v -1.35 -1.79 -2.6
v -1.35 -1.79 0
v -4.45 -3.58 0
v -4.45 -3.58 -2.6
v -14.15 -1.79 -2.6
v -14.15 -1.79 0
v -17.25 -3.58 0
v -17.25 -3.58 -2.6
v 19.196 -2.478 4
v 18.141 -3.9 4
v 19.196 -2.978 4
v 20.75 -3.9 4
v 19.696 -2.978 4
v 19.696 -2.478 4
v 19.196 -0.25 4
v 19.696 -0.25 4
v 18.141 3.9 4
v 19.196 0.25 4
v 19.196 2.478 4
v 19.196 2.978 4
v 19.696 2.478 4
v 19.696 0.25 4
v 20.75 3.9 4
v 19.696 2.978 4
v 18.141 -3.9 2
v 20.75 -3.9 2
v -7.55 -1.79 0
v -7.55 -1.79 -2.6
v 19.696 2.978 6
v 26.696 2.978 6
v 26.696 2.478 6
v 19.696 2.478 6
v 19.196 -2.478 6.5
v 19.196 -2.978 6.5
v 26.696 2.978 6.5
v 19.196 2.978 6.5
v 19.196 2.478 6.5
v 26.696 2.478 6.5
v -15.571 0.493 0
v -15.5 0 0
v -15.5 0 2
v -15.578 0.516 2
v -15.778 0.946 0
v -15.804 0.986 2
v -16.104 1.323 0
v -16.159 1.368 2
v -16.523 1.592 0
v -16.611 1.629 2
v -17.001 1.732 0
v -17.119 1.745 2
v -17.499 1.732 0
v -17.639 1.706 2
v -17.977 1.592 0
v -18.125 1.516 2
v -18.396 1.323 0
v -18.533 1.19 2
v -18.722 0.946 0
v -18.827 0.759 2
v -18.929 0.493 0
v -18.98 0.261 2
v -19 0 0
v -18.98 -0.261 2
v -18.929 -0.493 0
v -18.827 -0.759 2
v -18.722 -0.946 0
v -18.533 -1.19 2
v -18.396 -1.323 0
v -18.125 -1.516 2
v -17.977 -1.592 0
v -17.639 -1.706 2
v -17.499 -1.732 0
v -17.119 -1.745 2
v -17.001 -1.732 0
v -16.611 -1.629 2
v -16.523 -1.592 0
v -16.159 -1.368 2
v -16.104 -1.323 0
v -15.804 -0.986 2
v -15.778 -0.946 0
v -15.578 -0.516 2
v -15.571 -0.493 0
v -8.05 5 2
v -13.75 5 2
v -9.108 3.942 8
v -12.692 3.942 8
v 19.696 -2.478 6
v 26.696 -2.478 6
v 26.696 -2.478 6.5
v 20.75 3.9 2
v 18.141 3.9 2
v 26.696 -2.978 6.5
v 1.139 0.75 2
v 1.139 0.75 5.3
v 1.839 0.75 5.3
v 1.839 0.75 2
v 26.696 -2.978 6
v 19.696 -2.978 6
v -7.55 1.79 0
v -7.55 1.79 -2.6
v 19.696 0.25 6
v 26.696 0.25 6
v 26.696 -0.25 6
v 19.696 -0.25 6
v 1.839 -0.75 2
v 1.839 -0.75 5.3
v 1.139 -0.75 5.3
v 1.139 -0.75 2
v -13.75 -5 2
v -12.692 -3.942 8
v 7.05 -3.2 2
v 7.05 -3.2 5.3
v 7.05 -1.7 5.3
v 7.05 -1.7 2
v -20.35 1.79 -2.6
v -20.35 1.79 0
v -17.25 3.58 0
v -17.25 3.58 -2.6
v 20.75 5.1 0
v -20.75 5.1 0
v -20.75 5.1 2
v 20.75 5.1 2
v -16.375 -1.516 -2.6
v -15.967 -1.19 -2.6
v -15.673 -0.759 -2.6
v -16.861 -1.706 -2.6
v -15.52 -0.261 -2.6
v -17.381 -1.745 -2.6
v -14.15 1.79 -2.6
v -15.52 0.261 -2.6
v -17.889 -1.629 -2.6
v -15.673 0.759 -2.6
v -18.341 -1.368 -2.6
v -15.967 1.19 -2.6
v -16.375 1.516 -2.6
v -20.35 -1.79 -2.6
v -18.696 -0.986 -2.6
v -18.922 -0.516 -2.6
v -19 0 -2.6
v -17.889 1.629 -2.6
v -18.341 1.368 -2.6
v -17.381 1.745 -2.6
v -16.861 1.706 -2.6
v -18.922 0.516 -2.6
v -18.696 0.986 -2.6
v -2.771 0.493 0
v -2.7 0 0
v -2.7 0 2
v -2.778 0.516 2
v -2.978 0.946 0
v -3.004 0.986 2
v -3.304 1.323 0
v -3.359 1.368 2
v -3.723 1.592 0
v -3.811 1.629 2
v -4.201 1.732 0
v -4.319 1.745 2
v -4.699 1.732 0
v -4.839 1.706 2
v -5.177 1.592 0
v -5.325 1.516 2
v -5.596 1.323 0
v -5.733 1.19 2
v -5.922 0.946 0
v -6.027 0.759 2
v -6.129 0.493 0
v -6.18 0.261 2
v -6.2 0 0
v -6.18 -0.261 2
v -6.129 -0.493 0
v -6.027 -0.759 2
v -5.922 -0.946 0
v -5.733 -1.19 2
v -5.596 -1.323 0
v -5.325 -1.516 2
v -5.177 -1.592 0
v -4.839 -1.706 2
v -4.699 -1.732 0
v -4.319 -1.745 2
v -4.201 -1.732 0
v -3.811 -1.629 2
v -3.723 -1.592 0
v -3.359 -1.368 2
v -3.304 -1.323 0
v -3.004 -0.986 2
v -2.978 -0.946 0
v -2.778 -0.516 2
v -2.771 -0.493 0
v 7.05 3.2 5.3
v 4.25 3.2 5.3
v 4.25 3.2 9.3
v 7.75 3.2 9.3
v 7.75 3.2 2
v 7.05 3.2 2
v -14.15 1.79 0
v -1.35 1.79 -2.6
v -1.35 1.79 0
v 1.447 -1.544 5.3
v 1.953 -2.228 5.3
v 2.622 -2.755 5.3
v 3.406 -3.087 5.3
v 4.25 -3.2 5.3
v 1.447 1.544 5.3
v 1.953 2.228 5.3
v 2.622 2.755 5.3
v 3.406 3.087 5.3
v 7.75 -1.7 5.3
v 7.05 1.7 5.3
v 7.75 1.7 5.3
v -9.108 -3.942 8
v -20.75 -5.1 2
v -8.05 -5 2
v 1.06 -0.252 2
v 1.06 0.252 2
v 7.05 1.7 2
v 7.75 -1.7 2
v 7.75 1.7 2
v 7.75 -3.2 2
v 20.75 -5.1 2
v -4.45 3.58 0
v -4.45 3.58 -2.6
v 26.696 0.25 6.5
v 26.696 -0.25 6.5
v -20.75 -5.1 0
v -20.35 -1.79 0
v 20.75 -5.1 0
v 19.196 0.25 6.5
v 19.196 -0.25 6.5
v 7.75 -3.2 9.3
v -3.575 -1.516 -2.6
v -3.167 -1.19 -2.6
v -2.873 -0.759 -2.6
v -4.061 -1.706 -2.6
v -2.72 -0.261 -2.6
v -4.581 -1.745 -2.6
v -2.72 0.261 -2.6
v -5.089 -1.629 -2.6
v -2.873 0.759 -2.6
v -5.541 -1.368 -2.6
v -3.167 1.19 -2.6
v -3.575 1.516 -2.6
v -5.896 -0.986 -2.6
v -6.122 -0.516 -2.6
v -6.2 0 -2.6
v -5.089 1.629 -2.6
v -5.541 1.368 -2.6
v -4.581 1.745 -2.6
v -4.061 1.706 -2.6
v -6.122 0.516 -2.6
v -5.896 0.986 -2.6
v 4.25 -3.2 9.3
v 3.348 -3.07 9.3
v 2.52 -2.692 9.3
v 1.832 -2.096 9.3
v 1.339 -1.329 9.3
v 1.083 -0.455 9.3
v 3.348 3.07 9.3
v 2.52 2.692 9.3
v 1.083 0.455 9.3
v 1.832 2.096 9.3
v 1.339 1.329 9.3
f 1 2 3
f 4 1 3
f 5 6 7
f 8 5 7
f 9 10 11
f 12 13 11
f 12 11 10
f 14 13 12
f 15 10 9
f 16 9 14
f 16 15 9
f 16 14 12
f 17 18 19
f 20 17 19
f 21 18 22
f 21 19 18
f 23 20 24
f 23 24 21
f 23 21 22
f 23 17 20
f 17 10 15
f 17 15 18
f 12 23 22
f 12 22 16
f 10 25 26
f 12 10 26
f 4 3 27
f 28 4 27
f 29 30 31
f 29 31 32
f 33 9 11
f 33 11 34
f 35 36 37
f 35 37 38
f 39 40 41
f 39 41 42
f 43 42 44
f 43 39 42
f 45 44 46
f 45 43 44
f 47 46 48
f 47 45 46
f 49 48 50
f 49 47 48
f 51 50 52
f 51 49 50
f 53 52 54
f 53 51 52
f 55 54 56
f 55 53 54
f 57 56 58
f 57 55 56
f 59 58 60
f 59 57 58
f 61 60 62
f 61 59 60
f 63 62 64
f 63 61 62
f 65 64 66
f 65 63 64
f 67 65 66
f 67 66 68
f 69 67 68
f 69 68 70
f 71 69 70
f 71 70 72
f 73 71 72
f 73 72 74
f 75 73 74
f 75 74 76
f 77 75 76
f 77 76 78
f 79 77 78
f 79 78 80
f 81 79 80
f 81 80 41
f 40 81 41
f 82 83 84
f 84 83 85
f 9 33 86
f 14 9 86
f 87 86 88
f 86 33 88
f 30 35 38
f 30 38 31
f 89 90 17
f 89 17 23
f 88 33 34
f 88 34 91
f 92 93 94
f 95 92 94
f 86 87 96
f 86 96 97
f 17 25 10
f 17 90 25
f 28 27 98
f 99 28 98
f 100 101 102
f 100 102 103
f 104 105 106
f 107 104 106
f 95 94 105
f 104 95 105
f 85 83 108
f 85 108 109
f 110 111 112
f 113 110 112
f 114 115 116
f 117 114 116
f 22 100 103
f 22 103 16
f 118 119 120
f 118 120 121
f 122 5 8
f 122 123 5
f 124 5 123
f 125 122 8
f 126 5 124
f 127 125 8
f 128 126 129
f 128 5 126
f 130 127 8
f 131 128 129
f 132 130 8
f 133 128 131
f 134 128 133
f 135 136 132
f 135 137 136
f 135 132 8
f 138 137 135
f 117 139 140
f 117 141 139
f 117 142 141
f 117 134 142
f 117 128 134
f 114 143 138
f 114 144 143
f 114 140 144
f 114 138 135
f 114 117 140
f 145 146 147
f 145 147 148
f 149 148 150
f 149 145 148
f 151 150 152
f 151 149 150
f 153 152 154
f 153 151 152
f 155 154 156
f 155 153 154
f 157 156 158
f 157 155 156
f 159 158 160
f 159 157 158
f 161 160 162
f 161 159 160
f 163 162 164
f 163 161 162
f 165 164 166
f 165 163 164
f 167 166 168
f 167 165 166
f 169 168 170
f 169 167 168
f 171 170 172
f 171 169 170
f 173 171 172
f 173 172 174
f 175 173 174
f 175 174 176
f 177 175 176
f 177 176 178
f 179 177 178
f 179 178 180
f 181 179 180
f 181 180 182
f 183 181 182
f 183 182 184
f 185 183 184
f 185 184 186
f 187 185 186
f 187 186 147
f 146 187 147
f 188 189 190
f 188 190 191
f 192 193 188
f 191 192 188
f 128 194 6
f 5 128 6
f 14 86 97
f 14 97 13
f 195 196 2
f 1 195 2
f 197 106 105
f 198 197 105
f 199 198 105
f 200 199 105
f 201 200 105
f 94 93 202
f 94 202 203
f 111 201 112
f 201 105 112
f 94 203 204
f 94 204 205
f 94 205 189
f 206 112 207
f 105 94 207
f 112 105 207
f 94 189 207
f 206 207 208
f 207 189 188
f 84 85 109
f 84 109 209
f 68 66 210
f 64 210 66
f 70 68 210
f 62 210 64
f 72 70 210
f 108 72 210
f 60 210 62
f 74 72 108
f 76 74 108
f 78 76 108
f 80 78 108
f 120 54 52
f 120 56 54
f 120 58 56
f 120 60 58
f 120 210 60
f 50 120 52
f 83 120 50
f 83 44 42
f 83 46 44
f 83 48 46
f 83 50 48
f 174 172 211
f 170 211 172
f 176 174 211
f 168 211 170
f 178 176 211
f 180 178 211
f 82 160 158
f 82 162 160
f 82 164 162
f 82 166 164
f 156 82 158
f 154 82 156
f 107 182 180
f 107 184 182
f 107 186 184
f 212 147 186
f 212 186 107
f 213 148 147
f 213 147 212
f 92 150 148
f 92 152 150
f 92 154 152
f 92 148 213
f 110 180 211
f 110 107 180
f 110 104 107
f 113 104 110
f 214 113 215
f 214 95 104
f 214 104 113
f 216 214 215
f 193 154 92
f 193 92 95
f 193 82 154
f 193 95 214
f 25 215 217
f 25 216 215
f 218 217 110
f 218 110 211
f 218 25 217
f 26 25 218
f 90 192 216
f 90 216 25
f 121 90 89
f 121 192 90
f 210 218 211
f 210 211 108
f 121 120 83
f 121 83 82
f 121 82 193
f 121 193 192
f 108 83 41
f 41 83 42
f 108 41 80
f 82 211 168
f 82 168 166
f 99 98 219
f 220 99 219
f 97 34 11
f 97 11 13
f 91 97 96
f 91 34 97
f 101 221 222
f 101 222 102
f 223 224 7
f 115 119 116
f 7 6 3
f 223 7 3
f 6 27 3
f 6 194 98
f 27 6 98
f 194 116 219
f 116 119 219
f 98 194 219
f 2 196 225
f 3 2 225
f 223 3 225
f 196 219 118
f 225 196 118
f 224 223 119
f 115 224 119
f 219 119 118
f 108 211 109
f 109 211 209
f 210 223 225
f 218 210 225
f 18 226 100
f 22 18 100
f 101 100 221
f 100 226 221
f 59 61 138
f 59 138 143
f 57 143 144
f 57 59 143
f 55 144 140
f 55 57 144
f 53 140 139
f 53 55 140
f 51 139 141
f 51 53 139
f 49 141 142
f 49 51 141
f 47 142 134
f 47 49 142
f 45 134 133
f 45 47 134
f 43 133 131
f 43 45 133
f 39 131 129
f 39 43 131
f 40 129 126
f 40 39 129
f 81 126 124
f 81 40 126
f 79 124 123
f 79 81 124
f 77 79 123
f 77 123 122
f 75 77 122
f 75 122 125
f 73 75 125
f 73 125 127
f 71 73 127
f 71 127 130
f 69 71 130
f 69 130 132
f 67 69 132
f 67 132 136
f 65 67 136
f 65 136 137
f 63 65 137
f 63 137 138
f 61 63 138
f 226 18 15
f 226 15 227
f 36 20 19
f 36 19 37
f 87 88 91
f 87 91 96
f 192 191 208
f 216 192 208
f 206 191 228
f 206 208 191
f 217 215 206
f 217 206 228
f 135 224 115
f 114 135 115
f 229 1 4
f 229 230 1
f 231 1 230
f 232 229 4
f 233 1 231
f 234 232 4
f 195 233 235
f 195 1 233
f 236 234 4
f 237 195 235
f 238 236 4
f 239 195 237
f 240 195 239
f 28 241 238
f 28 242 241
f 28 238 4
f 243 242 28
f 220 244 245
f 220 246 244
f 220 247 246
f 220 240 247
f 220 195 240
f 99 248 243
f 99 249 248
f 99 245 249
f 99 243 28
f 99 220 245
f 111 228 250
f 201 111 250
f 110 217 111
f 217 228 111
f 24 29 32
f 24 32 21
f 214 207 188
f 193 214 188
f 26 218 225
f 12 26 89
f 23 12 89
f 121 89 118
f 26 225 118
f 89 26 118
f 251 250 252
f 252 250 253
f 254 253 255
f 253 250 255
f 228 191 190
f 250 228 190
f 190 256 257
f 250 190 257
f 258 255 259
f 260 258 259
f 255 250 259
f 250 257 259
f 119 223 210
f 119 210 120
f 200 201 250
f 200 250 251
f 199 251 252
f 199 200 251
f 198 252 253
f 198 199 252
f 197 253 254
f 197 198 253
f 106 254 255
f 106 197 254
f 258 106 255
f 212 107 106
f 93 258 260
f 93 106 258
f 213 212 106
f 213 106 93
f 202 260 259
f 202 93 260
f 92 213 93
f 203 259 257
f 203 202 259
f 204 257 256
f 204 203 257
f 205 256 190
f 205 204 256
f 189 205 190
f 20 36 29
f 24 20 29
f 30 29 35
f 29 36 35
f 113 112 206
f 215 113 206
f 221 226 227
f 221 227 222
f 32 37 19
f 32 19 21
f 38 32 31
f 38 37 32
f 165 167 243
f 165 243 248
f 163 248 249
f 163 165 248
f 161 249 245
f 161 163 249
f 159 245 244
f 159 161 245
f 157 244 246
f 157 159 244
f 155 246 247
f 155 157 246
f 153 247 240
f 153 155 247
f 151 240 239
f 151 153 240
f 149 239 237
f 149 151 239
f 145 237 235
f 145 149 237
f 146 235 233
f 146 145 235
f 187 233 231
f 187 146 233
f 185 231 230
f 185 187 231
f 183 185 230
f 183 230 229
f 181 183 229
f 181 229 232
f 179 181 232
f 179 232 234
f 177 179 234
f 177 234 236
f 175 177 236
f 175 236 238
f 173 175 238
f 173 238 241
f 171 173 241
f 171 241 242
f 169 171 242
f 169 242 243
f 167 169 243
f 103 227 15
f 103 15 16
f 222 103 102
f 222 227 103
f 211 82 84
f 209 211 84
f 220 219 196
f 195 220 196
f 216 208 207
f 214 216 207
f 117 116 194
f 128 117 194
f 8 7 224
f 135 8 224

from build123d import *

# Parameters (mm, degrees)
ESBO_O1_W                = 41.5
ESBO_O1_H                = 10.2
ESBO_O1_R                = 1.75
RESSALTO_EXTRUS_O1_DEPTH = 2
ESBO_O2_W                = 5.7
ESBO_O2_H                = 10
RESSALTO_EXTRUS_O2_DEPTH = 6
RESSALTO_EXTRUS_O2_TAPER = 10
RESSALTO_EXTRUS_O3_DEPTH = 7.3
CORTE_EXTRUS_O1_START    = -4
CORTE_EXTRUS_O1_DEPTH    = 3.3
RESSALTO_EXTRUS_O4_DEPTH = 3.9
ESBO_O7_W                = 7.5
ESBO_O7_H                = 0.921500294
ESBO_O7_H_2              = 2.228499706
CORTE_EXTRUS_O2_DEPTH    = 2.5
ESBO_O8_R                = 1.75
RESSALTO_EXTRUS_O5_DEPTH = 2.6


with BuildPart() as part:
    # Esboço1 → Ressalto-extrusão1 (new body)
    with BuildSketch(Plane.XY):
        Rectangle(ESBO_O1_W, ESBO_O1_H)
        with Locations((-17.25, 0)):
            Circle(ESBO_O1_R, mode=Mode.SUBTRACT)
        with Locations((-4.45, 0)):
            Circle(ESBO_O1_R, mode=Mode.SUBTRACT)
    extrude(amount=RESSALTO_EXTRUS_O1_DEPTH)

    # Esboço2 → Ressalto-extrusão2 (add)
    with BuildSketch(Plane.XY.offset(2)):
        with Locations((-10.9, 0)):
            Rectangle(ESBO_O2_W, ESBO_O2_H)
    extrude(amount=RESSALTO_EXTRUS_O2_DEPTH, taper=RESSALTO_EXTRUS_O2_TAPER)

    # Esboço3 → Ressalto-extrusão3 (add)
    with BuildSketch(Plane.XY.offset(2)):
        with BuildLine():
            Line((4.25, 3.2), (7.75, 3.2))
            Line((7.75, 3.2), (7.75, -3.2))
            Line((7.75, -3.2), (4.25, -3.2))
            ThreePointArc((4.25, -3.2), (1.05, 0), (4.25, 3.2))
        make_face()
    extrude(amount=RESSALTO_EXTRUS_O3_DEPTH)

    # Esboço4 → Corte-extrusão1 (cut)
    with BuildSketch(Plane.XY.offset(9.3).offset(CORTE_EXTRUS_O1_START)):
        with BuildLine():
            Line((7.05, -3.2), (7.05, -1.7))
            Line((7.05, -1.7), (7.75, -1.7))
            Line((7.75, -1.7), (7.75, 1.7))
            Line((7.75, 1.7), (7.05, 1.7))
            Line((7.05, 1.7), (7.05, 3.2))
            Line((7.05, 3.2), (4.25, 3.2))
            ThreePointArc((4.25, 3.2), (2.270101013, 2.513961018), (1.139131954, 0.75))
            Line((1.139131954, 0.75), (1.839131954, 0.75))
            Line((1.839131954, 0.75), (1.839131954, -0.75))
            Line((1.839131954, -0.75), (1.139131954, -0.75))
            ThreePointArc((1.139131954, -0.75), (2.270101013, -2.513961018), (4.25, -3.2))
            Line((4.25, -3.2), (7.05, -3.2))
        make_face()
    extrude(amount=-CORTE_EXTRUS_O1_DEPTH, mode=Mode.SUBTRACT)

    # Esboço6 → Ressalto-extrusão4 (add, symmetric)
    with BuildSketch(Plane(origin=(0, 0, 0), x_dir=(1, 0, 0), z_dir=(0, 1, 0))):
        Polygon((18.141238668, -2), (18.141238668, -4), (19.195619334, -4), (19.195619334, -6.5), (26.695619334, -6.5), (26.695619334, -6), (19.695619334, -6), (19.695619334, -4), (20.75, -4), (20.75, -2), align=None)
    extrude(amount=RESSALTO_EXTRUS_O4_DEPTH, both=True)

    # Esboço7 → Corte-extrusão2 (cut)
    with BuildSketch(Plane.XY.offset(6.5)):
        with Locations((22.945619334, 3.439249853)):
            Rectangle(ESBO_O7_W, ESBO_O7_H)
        with Locations((22.945619334, 1.364249853)):
            Rectangle(ESBO_O7_W, ESBO_O7_H_2)
        with Locations((22.945619334, -1.364249853)):
            Rectangle(ESBO_O7_W, ESBO_O7_H_2)
        with Locations((22.945619334, -3.439249853)):
            Rectangle(ESBO_O7_W, ESBO_O7_H)
    extrude(amount=-CORTE_EXTRUS_O2_DEPTH, mode=Mode.SUBTRACT)

    # Esboço8 → Ressalto-extrusão5 (add)
    with BuildSketch(Plane(origin=(0, 0, 0), x_dir=(-1, 0, 0), z_dir=(0, 0, -1))):
        Polygon((7.55, 1.789785834), (4.45, 3.579571669), (1.35, 1.789785834), (1.35, -1.789785834), (4.45, -3.579571669), (7.55, -1.789785834), align=None)
        with Locations((4.45, 0)):
            Circle(ESBO_O8_R, mode=Mode.SUBTRACT)
        Polygon((14.15, -1.789785834), (17.25, -3.579571669), (20.35, -1.789785834), (20.35, 1.789785834), (17.25, 3.579571669), (14.15, 1.789785834), align=None)
        with Locations((17.25, 0)):
            Circle(ESBO_O8_R, mode=Mode.SUBTRACT)
    extrude(amount=RESSALTO_EXTRUS_O5_DEPTH)


solid = part.part
